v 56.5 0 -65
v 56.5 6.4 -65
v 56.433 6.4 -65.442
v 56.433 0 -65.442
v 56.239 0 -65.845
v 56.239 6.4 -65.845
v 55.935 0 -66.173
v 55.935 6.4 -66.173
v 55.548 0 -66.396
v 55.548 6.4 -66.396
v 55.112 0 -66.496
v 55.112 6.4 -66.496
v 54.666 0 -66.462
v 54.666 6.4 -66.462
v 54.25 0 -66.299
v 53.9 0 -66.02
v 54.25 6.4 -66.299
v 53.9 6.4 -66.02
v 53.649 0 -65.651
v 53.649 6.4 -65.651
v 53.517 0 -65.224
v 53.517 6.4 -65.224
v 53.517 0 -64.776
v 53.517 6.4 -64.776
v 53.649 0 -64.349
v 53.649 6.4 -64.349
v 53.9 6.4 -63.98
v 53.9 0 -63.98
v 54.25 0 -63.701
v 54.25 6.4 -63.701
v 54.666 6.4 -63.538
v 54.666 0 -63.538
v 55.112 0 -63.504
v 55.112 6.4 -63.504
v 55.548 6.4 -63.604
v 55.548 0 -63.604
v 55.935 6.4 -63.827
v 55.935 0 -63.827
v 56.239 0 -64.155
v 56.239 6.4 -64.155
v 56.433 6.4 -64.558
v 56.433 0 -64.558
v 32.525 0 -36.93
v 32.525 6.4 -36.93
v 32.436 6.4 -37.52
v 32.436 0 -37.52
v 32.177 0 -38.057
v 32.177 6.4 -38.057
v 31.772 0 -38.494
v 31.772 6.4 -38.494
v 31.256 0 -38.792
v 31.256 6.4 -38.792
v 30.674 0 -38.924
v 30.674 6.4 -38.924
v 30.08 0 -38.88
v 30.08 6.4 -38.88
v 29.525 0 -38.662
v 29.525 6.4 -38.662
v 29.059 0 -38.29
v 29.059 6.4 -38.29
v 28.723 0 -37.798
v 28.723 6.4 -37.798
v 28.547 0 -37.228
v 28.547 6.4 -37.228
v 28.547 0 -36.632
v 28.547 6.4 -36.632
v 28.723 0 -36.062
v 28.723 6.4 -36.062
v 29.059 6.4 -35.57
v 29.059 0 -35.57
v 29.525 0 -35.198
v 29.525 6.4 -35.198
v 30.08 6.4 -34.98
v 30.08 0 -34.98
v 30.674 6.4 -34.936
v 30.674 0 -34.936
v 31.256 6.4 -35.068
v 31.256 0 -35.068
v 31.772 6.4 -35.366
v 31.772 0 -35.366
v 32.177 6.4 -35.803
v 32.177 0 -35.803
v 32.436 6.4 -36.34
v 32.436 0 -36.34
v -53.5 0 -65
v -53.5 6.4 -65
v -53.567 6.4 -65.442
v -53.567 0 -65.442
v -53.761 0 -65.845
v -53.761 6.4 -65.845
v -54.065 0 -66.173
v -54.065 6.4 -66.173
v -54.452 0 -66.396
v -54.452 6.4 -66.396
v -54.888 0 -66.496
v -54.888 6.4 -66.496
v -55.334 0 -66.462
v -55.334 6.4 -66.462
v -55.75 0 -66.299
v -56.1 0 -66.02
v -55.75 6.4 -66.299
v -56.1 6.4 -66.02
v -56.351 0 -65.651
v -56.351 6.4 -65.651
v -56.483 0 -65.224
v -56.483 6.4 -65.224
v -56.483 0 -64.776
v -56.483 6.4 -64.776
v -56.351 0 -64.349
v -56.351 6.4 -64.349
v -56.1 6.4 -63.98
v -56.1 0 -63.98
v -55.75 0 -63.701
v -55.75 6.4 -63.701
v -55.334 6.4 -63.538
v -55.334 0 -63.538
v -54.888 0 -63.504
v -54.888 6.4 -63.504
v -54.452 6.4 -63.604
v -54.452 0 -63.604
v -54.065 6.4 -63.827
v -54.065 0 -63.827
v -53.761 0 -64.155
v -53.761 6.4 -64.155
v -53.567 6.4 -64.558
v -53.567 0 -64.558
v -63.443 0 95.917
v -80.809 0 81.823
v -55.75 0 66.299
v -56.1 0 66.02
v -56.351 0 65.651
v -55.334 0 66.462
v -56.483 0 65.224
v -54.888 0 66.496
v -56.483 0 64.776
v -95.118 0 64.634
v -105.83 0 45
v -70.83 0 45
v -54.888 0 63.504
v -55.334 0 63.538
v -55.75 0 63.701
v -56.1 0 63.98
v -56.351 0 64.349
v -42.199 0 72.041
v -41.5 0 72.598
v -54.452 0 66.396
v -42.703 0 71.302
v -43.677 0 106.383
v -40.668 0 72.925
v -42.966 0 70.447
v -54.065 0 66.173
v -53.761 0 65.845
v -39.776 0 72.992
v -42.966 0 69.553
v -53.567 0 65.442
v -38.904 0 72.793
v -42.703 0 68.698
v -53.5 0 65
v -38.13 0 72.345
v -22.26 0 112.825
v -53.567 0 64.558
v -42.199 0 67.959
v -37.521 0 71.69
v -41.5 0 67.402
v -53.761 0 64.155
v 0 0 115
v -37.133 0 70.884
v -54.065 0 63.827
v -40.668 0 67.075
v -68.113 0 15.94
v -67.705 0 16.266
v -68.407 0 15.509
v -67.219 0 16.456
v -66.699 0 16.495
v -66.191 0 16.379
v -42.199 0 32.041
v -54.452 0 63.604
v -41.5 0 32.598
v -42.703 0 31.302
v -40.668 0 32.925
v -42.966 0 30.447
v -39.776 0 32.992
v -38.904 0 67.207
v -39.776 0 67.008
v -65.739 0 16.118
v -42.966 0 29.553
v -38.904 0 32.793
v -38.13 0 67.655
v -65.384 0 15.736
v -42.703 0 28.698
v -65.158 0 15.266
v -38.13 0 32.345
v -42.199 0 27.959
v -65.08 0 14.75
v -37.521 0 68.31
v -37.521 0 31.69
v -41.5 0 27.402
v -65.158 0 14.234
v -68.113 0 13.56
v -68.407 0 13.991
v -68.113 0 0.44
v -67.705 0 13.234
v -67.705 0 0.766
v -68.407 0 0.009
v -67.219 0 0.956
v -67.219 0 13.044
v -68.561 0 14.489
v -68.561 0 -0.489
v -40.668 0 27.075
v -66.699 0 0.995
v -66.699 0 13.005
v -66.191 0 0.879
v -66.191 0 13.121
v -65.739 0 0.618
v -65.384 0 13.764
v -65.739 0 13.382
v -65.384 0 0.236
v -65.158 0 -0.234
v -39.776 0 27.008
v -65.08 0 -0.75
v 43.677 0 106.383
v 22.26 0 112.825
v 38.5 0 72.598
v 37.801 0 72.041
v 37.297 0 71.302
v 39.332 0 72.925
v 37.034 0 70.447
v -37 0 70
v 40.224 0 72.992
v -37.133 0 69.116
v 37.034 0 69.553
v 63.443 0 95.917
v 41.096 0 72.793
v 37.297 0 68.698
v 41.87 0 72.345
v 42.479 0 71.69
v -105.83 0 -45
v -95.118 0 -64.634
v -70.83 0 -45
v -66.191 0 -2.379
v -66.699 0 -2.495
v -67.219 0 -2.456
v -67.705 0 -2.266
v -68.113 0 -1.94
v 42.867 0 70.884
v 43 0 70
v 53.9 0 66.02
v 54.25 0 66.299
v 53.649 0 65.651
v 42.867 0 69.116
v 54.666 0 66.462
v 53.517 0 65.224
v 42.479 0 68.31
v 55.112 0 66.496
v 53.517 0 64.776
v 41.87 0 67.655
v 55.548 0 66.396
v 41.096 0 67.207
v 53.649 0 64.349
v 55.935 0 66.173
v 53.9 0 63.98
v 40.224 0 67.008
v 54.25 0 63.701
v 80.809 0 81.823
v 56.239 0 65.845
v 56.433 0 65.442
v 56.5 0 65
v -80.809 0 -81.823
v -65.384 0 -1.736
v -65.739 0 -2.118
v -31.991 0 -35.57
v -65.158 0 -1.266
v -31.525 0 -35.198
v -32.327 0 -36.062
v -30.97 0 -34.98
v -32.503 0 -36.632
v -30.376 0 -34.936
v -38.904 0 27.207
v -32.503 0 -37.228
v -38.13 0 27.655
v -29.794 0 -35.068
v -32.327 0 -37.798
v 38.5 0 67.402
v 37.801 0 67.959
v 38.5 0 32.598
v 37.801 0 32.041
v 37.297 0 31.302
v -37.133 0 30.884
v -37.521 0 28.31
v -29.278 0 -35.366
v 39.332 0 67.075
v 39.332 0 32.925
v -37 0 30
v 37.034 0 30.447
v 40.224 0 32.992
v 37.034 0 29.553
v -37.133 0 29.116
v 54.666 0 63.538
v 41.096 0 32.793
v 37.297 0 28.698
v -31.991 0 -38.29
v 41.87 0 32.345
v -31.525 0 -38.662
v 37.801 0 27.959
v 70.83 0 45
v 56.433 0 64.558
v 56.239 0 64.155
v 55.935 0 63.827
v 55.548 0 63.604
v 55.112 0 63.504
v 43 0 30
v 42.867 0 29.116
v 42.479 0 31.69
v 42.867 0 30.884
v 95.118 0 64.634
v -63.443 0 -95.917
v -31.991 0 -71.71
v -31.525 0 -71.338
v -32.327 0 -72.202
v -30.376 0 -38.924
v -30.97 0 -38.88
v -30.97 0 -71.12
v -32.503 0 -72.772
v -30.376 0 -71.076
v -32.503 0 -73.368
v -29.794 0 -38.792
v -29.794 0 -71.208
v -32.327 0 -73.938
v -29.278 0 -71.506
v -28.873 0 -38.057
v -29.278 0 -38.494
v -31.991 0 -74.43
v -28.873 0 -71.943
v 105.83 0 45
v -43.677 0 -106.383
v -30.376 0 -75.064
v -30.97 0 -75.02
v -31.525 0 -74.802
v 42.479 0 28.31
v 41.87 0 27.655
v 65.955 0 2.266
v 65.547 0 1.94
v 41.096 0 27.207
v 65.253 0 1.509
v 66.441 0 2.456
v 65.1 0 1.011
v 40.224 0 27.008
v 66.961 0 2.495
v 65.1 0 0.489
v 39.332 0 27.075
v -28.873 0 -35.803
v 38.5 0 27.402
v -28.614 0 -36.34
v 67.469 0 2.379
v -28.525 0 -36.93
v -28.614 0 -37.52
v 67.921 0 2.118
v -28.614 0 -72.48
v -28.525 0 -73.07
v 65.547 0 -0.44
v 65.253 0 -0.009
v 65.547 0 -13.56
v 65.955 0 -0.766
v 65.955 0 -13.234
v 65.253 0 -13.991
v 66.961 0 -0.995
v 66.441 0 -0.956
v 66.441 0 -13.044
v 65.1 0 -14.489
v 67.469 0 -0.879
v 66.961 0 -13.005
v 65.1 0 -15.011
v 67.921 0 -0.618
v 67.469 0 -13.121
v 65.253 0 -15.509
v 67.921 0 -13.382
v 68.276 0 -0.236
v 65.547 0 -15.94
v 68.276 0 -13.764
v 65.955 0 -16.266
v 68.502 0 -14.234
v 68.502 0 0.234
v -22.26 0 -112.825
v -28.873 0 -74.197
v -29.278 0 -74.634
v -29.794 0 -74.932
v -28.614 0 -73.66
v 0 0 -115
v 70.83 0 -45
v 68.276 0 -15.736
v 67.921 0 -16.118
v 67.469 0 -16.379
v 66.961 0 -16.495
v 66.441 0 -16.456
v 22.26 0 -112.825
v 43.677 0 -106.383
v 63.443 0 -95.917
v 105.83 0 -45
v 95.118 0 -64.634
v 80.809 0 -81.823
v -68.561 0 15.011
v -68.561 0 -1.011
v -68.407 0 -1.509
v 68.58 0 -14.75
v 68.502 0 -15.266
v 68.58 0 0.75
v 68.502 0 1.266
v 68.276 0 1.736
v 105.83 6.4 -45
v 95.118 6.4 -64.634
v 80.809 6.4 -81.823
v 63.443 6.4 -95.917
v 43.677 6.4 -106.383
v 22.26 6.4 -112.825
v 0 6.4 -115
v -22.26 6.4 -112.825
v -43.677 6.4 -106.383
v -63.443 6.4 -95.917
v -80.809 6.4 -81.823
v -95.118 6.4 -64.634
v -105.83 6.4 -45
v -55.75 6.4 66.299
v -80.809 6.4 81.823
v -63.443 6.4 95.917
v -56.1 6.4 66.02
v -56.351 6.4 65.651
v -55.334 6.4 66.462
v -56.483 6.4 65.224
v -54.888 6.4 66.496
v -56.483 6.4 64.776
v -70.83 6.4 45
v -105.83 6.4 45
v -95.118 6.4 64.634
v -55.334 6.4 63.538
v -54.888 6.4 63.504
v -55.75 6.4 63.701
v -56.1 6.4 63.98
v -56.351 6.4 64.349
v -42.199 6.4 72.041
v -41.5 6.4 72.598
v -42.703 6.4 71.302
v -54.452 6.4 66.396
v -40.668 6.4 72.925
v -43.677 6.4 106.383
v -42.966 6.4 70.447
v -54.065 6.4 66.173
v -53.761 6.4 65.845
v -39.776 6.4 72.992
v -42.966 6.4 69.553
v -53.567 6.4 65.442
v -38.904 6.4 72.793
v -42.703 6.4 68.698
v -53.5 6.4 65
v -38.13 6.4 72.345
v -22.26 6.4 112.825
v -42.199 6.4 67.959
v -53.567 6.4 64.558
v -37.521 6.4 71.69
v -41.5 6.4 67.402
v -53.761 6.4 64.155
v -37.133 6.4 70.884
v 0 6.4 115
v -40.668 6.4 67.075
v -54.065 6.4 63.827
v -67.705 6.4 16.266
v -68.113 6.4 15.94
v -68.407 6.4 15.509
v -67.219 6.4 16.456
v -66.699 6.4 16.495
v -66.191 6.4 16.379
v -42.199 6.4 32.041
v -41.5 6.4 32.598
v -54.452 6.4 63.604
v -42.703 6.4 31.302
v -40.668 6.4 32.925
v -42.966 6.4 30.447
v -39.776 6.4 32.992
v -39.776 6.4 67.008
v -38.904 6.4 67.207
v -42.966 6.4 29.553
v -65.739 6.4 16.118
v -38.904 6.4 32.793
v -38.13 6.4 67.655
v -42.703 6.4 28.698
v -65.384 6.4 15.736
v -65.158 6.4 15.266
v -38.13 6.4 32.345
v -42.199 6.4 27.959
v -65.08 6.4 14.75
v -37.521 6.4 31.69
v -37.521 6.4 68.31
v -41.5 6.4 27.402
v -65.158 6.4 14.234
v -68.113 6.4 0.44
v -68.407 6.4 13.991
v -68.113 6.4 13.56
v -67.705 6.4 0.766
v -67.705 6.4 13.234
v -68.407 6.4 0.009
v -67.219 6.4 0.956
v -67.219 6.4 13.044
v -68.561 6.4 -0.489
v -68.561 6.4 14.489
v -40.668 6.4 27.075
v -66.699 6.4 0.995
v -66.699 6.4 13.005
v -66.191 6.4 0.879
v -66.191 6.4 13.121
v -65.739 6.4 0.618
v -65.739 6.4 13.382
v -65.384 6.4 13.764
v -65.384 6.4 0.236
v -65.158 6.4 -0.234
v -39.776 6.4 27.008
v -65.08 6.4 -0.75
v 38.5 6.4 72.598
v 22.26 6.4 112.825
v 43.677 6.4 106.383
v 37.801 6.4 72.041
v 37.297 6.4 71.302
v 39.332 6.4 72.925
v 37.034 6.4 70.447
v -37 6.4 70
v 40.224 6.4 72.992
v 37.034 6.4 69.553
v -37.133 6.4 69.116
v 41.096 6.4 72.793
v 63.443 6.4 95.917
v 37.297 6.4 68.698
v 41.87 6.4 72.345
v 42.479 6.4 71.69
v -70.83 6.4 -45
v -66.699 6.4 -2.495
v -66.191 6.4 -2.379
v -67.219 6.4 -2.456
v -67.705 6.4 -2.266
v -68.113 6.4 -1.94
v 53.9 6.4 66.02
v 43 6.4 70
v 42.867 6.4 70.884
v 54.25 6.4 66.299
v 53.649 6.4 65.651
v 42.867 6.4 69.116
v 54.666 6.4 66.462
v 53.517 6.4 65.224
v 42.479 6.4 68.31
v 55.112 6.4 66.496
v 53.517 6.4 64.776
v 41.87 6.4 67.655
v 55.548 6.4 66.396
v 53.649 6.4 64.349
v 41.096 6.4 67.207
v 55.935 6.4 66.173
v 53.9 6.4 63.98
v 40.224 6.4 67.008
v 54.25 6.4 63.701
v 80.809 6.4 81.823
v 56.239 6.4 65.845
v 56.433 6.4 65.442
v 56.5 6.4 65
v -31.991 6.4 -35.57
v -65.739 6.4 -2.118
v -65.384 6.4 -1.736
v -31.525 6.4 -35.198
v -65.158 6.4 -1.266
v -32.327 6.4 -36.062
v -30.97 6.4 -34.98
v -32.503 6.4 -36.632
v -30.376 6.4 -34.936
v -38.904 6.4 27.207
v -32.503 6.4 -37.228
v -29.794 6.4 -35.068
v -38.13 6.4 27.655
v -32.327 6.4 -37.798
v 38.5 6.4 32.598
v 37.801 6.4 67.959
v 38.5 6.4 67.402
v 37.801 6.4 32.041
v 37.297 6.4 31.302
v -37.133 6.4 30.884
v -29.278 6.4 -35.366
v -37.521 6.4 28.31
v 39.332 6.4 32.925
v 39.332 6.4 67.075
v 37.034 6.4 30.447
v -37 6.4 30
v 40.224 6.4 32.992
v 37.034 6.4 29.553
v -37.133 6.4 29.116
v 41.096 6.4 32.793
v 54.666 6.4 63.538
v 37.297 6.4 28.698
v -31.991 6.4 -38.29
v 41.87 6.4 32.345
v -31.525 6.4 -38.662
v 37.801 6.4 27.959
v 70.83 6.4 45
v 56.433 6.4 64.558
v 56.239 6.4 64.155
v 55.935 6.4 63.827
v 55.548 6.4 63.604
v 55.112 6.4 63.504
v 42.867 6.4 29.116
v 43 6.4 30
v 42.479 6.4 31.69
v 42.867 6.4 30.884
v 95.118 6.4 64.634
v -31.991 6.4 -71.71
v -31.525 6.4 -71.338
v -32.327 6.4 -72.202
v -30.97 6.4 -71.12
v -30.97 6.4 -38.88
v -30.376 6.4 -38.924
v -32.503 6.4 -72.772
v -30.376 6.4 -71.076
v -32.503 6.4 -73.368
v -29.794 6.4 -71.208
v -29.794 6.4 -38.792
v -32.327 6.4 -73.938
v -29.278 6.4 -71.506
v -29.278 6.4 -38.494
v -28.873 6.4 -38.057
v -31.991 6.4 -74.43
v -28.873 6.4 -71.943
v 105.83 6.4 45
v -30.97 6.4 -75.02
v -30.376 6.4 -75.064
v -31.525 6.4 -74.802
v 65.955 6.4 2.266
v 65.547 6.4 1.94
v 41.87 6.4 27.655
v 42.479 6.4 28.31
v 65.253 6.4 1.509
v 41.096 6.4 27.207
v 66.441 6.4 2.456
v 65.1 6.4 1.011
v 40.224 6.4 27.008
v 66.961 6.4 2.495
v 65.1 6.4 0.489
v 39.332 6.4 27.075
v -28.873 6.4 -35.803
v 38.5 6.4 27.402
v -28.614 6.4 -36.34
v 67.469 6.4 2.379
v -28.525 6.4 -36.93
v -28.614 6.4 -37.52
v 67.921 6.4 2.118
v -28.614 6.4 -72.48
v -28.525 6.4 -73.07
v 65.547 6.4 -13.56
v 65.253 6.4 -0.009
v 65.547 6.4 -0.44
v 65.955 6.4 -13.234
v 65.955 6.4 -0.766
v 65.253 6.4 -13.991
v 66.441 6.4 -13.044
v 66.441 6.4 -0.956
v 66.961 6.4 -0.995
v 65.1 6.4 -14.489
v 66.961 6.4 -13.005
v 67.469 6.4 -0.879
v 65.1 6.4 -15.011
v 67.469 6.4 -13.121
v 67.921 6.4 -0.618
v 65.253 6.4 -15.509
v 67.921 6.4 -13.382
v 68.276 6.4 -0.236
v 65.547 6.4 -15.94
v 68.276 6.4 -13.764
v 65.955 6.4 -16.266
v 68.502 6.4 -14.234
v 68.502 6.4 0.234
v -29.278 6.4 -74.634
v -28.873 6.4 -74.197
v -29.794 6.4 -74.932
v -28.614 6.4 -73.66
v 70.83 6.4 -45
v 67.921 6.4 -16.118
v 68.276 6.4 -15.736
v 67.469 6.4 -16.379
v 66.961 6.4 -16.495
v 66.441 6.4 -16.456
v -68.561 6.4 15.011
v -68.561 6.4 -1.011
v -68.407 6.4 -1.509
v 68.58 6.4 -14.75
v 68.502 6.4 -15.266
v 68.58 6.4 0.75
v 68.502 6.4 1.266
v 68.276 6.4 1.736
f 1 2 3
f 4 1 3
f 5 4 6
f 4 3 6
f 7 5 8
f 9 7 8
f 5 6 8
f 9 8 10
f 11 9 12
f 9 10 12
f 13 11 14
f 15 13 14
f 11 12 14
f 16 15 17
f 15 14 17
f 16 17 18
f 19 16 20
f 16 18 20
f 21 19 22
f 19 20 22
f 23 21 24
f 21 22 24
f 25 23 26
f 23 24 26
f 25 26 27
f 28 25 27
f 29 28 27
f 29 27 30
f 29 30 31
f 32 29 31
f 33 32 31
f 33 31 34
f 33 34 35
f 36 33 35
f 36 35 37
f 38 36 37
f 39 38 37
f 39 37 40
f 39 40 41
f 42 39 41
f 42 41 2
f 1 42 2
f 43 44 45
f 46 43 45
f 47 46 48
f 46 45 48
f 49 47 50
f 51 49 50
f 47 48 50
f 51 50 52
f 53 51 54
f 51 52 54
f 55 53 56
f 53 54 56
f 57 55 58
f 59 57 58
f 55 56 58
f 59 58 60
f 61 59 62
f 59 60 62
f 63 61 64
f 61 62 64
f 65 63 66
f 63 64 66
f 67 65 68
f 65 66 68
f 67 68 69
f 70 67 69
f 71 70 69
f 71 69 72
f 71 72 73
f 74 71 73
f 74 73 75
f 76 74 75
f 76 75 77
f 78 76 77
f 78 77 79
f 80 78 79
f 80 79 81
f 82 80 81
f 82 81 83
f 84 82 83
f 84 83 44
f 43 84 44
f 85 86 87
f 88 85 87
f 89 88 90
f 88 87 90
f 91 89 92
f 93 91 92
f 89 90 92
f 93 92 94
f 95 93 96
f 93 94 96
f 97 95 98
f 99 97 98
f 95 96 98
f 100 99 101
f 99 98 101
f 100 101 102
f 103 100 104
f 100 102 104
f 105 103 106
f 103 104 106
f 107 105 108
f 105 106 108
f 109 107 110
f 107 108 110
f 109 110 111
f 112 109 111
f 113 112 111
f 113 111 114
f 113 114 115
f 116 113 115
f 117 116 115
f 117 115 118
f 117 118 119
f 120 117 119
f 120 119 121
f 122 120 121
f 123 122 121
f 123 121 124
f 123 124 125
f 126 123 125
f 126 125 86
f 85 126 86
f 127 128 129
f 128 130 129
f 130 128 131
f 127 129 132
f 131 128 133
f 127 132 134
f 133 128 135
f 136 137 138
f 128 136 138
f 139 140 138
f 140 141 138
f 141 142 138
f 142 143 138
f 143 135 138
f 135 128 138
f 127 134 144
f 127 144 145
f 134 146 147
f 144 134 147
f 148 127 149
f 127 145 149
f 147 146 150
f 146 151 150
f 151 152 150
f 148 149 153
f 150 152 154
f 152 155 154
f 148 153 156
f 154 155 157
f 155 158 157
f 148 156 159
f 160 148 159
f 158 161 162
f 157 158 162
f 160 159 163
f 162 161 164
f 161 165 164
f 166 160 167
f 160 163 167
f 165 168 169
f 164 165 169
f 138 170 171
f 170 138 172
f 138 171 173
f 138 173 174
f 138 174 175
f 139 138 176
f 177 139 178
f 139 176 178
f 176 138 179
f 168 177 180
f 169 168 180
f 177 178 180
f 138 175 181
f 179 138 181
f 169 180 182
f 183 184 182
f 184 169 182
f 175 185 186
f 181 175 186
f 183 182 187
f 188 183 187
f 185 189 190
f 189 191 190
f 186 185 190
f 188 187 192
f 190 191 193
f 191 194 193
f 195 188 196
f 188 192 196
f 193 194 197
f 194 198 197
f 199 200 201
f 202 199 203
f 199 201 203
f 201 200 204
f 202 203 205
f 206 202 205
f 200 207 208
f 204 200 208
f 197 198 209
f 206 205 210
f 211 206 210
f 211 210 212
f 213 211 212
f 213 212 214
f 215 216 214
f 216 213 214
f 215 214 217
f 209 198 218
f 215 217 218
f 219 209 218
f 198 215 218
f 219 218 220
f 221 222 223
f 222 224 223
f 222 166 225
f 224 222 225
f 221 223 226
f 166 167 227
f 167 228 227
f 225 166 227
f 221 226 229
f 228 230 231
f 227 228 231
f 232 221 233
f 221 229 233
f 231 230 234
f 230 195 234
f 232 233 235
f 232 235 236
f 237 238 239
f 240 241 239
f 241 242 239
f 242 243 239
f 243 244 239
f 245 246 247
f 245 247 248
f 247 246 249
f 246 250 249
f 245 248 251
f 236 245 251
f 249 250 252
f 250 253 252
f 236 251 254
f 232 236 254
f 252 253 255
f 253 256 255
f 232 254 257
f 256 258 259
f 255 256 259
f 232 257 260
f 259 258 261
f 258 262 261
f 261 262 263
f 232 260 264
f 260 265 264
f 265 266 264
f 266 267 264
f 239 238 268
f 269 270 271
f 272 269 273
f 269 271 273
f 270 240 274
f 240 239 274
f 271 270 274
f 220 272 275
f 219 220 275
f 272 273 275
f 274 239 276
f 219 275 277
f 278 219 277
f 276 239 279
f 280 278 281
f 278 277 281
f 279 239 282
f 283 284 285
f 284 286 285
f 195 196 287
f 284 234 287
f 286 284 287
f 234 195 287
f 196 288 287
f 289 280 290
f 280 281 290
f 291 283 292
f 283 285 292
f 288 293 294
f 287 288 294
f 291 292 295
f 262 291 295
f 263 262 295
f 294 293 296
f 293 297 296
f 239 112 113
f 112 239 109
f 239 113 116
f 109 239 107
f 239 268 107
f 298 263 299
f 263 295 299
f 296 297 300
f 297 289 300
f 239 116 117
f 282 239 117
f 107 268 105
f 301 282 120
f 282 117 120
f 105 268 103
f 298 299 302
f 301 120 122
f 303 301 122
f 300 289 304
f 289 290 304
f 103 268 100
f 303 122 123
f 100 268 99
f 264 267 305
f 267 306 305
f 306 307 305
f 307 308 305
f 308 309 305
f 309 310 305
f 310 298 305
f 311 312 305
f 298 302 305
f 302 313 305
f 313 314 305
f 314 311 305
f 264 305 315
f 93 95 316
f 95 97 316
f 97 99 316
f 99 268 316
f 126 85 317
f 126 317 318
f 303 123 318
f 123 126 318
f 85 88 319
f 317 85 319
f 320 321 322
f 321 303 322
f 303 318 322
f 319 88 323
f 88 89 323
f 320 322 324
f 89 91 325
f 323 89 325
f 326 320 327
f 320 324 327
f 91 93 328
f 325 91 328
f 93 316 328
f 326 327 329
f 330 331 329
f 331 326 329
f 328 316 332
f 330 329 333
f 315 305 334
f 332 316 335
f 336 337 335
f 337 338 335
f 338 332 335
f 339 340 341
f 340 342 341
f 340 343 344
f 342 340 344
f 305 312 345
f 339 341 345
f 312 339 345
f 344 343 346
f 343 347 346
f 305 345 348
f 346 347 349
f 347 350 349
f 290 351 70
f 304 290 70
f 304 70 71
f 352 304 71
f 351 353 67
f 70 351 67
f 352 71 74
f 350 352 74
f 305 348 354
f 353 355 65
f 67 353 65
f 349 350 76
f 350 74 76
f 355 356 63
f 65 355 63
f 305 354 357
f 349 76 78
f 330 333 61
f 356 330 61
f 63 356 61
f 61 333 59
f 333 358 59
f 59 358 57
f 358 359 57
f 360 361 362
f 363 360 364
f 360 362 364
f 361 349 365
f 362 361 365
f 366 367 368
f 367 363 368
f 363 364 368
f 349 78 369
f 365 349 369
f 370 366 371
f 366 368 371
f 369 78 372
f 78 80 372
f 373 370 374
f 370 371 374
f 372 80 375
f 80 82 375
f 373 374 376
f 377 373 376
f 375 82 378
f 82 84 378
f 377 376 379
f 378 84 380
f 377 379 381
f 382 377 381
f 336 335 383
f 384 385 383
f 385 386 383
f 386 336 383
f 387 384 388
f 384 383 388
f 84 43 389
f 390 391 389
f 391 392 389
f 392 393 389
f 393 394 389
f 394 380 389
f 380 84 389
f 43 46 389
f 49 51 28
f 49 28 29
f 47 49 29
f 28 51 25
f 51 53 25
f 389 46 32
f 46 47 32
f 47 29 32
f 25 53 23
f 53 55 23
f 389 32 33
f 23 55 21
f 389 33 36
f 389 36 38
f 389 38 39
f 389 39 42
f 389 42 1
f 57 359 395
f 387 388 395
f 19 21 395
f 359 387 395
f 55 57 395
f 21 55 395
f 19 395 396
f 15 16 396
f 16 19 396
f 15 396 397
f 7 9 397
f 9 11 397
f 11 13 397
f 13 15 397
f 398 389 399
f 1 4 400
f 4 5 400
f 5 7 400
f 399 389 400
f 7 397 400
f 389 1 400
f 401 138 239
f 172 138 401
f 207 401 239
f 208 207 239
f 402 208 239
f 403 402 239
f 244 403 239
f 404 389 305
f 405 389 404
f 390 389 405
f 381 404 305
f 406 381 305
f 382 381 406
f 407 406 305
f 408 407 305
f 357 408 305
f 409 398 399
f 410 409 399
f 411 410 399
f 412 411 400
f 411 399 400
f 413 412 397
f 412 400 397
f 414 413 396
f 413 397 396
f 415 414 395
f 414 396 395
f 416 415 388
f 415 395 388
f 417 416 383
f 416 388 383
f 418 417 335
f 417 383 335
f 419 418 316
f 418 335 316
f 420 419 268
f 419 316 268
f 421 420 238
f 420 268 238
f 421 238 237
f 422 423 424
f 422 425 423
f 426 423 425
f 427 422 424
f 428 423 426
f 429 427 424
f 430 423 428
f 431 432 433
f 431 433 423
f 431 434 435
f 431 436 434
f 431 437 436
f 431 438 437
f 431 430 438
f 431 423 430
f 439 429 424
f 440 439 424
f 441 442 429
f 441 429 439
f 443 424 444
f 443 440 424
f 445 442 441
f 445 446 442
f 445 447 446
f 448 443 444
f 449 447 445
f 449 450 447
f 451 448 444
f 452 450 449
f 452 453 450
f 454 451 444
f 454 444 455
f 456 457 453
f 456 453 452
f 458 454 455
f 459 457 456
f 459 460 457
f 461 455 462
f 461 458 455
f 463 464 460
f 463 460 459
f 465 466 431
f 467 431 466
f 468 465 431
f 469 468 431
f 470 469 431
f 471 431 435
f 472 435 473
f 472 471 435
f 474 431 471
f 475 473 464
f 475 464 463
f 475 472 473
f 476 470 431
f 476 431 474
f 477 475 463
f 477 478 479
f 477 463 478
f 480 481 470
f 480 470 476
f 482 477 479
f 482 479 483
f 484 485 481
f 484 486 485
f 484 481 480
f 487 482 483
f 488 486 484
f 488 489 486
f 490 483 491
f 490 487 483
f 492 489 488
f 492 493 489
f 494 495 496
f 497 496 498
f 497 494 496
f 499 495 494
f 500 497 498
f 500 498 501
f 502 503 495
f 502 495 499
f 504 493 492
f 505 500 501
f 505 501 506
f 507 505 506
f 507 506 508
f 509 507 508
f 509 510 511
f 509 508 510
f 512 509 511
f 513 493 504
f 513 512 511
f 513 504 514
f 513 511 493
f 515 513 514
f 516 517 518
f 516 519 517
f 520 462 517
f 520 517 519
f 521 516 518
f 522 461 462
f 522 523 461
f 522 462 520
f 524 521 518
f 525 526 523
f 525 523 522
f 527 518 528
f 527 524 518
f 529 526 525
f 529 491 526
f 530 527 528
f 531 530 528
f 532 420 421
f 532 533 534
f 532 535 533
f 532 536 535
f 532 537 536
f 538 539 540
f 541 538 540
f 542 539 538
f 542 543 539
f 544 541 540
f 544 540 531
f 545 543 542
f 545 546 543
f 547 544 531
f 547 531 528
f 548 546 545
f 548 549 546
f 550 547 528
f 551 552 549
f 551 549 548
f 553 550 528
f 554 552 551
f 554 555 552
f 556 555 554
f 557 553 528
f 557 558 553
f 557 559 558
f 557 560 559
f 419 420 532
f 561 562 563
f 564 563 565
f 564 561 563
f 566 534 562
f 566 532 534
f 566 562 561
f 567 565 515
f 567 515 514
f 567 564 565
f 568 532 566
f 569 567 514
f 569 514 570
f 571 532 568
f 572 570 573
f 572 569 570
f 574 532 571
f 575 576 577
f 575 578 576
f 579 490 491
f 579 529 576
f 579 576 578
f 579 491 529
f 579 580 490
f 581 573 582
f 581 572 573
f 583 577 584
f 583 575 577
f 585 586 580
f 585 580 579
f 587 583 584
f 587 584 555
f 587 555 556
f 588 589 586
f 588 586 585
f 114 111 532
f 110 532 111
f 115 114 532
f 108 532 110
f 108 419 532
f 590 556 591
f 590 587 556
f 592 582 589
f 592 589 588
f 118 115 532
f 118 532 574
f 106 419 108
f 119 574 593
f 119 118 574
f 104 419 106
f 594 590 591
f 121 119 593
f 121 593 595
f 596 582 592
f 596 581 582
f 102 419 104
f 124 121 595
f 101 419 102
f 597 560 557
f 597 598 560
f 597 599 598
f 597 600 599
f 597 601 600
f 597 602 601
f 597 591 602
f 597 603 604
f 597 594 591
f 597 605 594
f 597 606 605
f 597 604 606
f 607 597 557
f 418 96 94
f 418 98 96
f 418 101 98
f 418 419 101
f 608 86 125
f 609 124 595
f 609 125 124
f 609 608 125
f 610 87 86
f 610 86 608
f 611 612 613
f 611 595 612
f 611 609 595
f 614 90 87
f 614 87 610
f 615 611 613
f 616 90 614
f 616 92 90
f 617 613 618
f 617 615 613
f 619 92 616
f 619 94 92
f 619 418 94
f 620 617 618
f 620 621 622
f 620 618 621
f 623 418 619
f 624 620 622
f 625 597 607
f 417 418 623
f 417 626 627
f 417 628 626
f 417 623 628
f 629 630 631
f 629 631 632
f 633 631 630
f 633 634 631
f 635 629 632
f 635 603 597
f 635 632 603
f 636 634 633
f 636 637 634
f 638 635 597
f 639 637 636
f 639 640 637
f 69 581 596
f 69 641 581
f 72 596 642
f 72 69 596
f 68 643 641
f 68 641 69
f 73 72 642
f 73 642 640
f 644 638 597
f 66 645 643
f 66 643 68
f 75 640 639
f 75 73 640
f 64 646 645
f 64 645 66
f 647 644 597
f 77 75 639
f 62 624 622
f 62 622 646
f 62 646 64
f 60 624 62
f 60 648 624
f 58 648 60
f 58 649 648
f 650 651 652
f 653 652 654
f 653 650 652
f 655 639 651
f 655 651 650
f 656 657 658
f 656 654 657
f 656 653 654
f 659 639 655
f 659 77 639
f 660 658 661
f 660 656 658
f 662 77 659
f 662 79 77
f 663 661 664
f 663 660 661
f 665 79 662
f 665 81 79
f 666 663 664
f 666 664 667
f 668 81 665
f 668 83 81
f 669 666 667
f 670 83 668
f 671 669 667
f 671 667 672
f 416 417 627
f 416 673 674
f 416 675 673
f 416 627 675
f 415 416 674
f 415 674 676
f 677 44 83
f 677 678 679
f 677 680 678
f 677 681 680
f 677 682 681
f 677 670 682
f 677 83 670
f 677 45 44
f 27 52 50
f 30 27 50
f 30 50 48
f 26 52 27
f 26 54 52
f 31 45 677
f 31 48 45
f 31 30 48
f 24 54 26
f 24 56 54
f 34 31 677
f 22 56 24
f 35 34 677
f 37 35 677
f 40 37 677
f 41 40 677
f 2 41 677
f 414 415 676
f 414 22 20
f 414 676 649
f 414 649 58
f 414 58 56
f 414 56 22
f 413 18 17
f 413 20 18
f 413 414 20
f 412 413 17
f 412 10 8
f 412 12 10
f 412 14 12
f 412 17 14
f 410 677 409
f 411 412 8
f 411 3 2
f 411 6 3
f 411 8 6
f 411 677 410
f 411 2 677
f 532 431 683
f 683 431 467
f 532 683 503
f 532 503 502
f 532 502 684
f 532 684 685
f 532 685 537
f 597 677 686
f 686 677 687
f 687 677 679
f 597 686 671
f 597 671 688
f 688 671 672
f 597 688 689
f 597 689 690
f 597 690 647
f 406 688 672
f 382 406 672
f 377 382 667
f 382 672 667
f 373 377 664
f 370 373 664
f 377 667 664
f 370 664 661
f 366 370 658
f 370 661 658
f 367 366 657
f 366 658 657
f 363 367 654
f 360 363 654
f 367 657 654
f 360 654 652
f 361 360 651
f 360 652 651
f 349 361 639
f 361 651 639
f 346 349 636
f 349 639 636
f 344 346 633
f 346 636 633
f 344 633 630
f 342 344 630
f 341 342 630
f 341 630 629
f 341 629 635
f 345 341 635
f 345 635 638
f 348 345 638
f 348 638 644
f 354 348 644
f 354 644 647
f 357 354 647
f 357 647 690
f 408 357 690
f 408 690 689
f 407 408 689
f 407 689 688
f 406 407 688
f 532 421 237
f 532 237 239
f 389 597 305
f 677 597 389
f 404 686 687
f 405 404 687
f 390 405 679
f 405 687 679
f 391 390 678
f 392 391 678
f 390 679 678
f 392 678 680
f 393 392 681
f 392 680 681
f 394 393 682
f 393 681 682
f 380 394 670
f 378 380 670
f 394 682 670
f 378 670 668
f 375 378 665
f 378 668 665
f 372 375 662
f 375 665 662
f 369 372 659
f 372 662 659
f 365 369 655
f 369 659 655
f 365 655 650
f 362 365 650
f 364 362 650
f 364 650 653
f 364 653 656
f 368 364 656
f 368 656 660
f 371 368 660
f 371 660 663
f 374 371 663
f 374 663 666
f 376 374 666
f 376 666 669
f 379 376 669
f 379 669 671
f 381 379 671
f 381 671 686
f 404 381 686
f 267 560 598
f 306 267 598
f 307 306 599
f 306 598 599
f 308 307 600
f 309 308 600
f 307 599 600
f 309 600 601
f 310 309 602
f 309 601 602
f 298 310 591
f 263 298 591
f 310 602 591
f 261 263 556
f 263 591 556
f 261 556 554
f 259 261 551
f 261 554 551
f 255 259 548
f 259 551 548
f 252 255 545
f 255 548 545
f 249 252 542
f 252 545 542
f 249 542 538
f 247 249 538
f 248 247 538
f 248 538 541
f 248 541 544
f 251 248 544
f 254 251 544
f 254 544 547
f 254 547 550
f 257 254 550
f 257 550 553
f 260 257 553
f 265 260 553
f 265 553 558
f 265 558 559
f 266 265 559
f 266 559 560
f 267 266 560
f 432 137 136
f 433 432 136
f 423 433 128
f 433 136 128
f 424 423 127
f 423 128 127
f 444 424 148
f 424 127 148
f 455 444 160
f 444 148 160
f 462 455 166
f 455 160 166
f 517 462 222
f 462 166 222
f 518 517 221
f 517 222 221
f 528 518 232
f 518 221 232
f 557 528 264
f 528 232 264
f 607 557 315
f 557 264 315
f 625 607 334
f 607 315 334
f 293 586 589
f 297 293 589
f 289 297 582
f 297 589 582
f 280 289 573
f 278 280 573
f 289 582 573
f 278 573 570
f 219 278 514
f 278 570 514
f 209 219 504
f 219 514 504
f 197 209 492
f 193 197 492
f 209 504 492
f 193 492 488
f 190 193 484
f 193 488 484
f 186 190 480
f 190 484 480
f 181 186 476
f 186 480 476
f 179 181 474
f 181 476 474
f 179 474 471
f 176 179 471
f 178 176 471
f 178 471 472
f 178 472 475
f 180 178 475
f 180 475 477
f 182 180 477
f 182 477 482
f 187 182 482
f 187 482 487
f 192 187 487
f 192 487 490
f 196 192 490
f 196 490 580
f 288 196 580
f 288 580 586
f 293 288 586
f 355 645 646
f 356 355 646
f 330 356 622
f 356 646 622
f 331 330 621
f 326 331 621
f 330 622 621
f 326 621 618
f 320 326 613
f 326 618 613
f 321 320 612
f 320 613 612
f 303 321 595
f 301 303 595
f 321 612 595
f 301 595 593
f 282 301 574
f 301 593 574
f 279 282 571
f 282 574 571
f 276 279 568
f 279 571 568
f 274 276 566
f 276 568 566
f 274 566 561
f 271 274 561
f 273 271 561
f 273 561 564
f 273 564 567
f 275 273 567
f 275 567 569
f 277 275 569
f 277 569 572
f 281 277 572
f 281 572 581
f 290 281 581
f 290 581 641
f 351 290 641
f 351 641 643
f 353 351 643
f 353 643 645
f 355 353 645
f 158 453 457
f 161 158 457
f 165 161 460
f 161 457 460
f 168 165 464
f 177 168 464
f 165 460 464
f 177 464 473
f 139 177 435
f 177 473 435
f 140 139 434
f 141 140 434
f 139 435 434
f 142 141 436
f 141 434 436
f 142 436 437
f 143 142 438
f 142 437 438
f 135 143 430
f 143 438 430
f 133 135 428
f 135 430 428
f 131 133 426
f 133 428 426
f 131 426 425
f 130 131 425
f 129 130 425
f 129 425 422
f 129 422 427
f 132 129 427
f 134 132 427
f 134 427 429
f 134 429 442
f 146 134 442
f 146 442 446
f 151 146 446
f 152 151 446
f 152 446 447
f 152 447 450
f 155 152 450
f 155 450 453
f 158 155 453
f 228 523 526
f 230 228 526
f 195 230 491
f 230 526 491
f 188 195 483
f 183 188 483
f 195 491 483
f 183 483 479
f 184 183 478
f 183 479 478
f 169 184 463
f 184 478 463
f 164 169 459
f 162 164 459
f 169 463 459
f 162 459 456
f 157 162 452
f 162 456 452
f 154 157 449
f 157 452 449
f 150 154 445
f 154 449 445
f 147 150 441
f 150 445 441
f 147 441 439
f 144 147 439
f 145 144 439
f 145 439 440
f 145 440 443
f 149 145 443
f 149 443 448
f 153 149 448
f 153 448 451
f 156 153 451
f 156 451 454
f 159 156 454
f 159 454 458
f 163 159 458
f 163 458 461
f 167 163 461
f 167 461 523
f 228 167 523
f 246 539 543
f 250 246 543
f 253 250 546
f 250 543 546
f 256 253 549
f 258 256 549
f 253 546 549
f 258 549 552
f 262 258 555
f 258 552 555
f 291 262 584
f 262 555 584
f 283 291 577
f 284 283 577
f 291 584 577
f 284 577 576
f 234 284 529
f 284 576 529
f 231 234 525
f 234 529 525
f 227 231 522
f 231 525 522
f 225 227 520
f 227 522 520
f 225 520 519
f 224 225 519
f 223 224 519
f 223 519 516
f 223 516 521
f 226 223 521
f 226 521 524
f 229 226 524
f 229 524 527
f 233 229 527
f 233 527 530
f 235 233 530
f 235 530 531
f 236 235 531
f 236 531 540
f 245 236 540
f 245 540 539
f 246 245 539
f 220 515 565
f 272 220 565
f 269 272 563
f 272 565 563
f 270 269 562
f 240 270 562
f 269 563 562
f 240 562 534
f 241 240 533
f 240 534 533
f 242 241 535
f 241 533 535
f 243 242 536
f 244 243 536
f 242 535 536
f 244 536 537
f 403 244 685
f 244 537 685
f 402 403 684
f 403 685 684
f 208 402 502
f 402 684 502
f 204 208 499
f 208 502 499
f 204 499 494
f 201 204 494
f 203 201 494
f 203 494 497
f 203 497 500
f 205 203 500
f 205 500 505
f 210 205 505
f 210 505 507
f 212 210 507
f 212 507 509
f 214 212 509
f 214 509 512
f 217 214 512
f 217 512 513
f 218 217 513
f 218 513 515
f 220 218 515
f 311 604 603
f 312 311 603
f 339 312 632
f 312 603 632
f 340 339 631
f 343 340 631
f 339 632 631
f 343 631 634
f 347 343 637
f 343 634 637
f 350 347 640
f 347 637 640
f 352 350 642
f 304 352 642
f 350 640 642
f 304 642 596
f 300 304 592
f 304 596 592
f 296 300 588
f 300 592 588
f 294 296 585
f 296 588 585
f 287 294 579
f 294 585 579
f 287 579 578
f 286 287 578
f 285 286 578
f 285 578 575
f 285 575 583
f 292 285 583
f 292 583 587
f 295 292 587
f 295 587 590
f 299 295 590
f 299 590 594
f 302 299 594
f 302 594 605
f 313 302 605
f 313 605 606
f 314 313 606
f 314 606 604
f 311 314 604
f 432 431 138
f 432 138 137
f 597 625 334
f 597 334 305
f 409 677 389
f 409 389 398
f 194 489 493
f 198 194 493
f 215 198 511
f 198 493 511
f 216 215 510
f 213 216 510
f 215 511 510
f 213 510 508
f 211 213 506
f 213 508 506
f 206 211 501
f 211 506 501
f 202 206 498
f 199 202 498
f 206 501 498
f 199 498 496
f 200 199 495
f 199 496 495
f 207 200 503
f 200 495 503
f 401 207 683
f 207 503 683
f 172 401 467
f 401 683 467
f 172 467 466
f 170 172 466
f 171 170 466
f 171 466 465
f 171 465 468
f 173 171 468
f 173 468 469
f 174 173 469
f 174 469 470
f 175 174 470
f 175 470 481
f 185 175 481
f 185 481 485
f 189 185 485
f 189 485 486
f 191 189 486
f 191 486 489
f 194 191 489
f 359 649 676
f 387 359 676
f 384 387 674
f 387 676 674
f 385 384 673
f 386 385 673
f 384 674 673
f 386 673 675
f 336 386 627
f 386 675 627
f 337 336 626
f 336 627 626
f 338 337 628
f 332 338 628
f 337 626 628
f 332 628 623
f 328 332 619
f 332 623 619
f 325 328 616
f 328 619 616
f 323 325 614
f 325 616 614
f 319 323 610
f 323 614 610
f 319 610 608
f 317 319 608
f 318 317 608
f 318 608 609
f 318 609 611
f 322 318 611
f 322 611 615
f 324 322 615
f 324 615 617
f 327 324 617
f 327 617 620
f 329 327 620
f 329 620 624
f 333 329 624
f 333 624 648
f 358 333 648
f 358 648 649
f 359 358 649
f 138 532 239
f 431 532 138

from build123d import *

# Parameters (mm, degrees)
SKETCH1_R             = 115
BOSS_EXTRUDE1_DEPTH   = 6.4
CUT_EXTRUDE1_DEPTH    = 7.5
SKETCH3_R             = 1.75
CUT_EXTRUDE2_DEPTH    = 7.4
SKETCH4_R             = 2
CUT_EXTRUDE3_DEPTH    = 7.4
SKETCH5_R             = 3
CUT_EXTRUDE4_DEPTH    = 7.4
F_3_0MM_DOWEL_HOLE1_D = 3


with BuildPart() as part:
    # Sketch1 → Boss-Extrude1 (new body)
    with BuildSketch(Plane(origin=(0, 0, 0), x_dir=(1, 0, 0), z_dir=(0, 1, 0))):
        Circle(SKETCH1_R)
    extrude(amount=BOSS_EXTRUDE1_DEPTH)

    # Sketch2 → Cut-Extrude1 (cut)
    with BuildSketch(Plane(origin=(0, 6.4, 0), x_dir=(1, 0, 0), z_dir=(0, 1, 0))):
        with BuildLine():
            Line((-105.830052443, 45), (-70.830052443, 45))
            Line((-70.830052443, 45), (-70.830052443, -45))
            Line((-70.830052443, -45), (-105.830052443, -45))
            ThreePointArc((-105.830052443, -45), (-115, 0), (-105.830052443, 45))
        make_face()
        with BuildLine():
            Line((105.830052443, -45), (70.830052443, -45))
            Line((70.830052443, -45), (70.830052443, 45))
            Line((70.830052443, 45), (105.830052443, 45))
            ThreePointArc((105.830052443, 45), (115, 0), (105.830052443, -45))
        make_face()
    extrude(amount=-CUT_EXTRUDE1_DEPTH, mode=Mode.SUBTRACT)

    # Sketch3 → Cut-Extrude2 (cut, through all)
    with BuildSketch(Plane(origin=(0, 6.4, 0), x_dir=(1, 0, 0), z_dir=(0, 1, 0))):
        with Locations((-66.830052443, 0.75)):
            Circle(SKETCH3_R)
        with Locations((-66.830052443, -14.75)):
            Circle(SKETCH3_R)
        with Locations((66.830052443, -0.75)):
            Circle(SKETCH3_R)
        with Locations((66.830052443, 14.75)):
            Circle(SKETCH3_R)
    extrude(amount=-CUT_EXTRUDE2_DEPTH, mode=Mode.SUBTRACT)

    # Sketch4 → Cut-Extrude3 (cut, through all)
    with BuildSketch(Plane(origin=(0, 6.4, 0), x_dir=(1, 0, 0), z_dir=(0, 1, 0))):
        with Locations((30.525, 36.93)):
            Circle(SKETCH4_R)
        with Locations((-30.525, 36.93)):
            Circle(SKETCH4_R)
        with Locations((-30.525, 73.07)):
            Circle(SKETCH4_R)
    extrude(amount=-CUT_EXTRUDE3_DEPTH, mode=Mode.SUBTRACT)

    # Sketch5 → Cut-Extrude4 (cut, through all)
    with BuildSketch(Plane(origin=(0, 6.4, 0), x_dir=(1, 0, 0), z_dir=(0, 1, 0))):
        with Locations((-40, -30)):
            Circle(SKETCH5_R)
        with Locations((40, -30)):
            Circle(SKETCH5_R)
        with Locations((40, -70)):
            Circle(SKETCH5_R)
        with Locations((-40, -70)):
            Circle(SKETCH5_R)
    extrude(amount=-CUT_EXTRUDE4_DEPTH, mode=Mode.SUBTRACT)

    # Ø3.0mm Dowel Hole1 (through all)
    with Locations(Plane(origin=(0, 0, 0), x_dir=(-1, 0, 0), z_dir=(0, -1, 0))):
        with Locations((-55, 65), (55, 65), (55, -65), (-55, -65)):
            Hole(F_3_0MM_DOWEL_HOLE1_D / 2)


solid = part.part
